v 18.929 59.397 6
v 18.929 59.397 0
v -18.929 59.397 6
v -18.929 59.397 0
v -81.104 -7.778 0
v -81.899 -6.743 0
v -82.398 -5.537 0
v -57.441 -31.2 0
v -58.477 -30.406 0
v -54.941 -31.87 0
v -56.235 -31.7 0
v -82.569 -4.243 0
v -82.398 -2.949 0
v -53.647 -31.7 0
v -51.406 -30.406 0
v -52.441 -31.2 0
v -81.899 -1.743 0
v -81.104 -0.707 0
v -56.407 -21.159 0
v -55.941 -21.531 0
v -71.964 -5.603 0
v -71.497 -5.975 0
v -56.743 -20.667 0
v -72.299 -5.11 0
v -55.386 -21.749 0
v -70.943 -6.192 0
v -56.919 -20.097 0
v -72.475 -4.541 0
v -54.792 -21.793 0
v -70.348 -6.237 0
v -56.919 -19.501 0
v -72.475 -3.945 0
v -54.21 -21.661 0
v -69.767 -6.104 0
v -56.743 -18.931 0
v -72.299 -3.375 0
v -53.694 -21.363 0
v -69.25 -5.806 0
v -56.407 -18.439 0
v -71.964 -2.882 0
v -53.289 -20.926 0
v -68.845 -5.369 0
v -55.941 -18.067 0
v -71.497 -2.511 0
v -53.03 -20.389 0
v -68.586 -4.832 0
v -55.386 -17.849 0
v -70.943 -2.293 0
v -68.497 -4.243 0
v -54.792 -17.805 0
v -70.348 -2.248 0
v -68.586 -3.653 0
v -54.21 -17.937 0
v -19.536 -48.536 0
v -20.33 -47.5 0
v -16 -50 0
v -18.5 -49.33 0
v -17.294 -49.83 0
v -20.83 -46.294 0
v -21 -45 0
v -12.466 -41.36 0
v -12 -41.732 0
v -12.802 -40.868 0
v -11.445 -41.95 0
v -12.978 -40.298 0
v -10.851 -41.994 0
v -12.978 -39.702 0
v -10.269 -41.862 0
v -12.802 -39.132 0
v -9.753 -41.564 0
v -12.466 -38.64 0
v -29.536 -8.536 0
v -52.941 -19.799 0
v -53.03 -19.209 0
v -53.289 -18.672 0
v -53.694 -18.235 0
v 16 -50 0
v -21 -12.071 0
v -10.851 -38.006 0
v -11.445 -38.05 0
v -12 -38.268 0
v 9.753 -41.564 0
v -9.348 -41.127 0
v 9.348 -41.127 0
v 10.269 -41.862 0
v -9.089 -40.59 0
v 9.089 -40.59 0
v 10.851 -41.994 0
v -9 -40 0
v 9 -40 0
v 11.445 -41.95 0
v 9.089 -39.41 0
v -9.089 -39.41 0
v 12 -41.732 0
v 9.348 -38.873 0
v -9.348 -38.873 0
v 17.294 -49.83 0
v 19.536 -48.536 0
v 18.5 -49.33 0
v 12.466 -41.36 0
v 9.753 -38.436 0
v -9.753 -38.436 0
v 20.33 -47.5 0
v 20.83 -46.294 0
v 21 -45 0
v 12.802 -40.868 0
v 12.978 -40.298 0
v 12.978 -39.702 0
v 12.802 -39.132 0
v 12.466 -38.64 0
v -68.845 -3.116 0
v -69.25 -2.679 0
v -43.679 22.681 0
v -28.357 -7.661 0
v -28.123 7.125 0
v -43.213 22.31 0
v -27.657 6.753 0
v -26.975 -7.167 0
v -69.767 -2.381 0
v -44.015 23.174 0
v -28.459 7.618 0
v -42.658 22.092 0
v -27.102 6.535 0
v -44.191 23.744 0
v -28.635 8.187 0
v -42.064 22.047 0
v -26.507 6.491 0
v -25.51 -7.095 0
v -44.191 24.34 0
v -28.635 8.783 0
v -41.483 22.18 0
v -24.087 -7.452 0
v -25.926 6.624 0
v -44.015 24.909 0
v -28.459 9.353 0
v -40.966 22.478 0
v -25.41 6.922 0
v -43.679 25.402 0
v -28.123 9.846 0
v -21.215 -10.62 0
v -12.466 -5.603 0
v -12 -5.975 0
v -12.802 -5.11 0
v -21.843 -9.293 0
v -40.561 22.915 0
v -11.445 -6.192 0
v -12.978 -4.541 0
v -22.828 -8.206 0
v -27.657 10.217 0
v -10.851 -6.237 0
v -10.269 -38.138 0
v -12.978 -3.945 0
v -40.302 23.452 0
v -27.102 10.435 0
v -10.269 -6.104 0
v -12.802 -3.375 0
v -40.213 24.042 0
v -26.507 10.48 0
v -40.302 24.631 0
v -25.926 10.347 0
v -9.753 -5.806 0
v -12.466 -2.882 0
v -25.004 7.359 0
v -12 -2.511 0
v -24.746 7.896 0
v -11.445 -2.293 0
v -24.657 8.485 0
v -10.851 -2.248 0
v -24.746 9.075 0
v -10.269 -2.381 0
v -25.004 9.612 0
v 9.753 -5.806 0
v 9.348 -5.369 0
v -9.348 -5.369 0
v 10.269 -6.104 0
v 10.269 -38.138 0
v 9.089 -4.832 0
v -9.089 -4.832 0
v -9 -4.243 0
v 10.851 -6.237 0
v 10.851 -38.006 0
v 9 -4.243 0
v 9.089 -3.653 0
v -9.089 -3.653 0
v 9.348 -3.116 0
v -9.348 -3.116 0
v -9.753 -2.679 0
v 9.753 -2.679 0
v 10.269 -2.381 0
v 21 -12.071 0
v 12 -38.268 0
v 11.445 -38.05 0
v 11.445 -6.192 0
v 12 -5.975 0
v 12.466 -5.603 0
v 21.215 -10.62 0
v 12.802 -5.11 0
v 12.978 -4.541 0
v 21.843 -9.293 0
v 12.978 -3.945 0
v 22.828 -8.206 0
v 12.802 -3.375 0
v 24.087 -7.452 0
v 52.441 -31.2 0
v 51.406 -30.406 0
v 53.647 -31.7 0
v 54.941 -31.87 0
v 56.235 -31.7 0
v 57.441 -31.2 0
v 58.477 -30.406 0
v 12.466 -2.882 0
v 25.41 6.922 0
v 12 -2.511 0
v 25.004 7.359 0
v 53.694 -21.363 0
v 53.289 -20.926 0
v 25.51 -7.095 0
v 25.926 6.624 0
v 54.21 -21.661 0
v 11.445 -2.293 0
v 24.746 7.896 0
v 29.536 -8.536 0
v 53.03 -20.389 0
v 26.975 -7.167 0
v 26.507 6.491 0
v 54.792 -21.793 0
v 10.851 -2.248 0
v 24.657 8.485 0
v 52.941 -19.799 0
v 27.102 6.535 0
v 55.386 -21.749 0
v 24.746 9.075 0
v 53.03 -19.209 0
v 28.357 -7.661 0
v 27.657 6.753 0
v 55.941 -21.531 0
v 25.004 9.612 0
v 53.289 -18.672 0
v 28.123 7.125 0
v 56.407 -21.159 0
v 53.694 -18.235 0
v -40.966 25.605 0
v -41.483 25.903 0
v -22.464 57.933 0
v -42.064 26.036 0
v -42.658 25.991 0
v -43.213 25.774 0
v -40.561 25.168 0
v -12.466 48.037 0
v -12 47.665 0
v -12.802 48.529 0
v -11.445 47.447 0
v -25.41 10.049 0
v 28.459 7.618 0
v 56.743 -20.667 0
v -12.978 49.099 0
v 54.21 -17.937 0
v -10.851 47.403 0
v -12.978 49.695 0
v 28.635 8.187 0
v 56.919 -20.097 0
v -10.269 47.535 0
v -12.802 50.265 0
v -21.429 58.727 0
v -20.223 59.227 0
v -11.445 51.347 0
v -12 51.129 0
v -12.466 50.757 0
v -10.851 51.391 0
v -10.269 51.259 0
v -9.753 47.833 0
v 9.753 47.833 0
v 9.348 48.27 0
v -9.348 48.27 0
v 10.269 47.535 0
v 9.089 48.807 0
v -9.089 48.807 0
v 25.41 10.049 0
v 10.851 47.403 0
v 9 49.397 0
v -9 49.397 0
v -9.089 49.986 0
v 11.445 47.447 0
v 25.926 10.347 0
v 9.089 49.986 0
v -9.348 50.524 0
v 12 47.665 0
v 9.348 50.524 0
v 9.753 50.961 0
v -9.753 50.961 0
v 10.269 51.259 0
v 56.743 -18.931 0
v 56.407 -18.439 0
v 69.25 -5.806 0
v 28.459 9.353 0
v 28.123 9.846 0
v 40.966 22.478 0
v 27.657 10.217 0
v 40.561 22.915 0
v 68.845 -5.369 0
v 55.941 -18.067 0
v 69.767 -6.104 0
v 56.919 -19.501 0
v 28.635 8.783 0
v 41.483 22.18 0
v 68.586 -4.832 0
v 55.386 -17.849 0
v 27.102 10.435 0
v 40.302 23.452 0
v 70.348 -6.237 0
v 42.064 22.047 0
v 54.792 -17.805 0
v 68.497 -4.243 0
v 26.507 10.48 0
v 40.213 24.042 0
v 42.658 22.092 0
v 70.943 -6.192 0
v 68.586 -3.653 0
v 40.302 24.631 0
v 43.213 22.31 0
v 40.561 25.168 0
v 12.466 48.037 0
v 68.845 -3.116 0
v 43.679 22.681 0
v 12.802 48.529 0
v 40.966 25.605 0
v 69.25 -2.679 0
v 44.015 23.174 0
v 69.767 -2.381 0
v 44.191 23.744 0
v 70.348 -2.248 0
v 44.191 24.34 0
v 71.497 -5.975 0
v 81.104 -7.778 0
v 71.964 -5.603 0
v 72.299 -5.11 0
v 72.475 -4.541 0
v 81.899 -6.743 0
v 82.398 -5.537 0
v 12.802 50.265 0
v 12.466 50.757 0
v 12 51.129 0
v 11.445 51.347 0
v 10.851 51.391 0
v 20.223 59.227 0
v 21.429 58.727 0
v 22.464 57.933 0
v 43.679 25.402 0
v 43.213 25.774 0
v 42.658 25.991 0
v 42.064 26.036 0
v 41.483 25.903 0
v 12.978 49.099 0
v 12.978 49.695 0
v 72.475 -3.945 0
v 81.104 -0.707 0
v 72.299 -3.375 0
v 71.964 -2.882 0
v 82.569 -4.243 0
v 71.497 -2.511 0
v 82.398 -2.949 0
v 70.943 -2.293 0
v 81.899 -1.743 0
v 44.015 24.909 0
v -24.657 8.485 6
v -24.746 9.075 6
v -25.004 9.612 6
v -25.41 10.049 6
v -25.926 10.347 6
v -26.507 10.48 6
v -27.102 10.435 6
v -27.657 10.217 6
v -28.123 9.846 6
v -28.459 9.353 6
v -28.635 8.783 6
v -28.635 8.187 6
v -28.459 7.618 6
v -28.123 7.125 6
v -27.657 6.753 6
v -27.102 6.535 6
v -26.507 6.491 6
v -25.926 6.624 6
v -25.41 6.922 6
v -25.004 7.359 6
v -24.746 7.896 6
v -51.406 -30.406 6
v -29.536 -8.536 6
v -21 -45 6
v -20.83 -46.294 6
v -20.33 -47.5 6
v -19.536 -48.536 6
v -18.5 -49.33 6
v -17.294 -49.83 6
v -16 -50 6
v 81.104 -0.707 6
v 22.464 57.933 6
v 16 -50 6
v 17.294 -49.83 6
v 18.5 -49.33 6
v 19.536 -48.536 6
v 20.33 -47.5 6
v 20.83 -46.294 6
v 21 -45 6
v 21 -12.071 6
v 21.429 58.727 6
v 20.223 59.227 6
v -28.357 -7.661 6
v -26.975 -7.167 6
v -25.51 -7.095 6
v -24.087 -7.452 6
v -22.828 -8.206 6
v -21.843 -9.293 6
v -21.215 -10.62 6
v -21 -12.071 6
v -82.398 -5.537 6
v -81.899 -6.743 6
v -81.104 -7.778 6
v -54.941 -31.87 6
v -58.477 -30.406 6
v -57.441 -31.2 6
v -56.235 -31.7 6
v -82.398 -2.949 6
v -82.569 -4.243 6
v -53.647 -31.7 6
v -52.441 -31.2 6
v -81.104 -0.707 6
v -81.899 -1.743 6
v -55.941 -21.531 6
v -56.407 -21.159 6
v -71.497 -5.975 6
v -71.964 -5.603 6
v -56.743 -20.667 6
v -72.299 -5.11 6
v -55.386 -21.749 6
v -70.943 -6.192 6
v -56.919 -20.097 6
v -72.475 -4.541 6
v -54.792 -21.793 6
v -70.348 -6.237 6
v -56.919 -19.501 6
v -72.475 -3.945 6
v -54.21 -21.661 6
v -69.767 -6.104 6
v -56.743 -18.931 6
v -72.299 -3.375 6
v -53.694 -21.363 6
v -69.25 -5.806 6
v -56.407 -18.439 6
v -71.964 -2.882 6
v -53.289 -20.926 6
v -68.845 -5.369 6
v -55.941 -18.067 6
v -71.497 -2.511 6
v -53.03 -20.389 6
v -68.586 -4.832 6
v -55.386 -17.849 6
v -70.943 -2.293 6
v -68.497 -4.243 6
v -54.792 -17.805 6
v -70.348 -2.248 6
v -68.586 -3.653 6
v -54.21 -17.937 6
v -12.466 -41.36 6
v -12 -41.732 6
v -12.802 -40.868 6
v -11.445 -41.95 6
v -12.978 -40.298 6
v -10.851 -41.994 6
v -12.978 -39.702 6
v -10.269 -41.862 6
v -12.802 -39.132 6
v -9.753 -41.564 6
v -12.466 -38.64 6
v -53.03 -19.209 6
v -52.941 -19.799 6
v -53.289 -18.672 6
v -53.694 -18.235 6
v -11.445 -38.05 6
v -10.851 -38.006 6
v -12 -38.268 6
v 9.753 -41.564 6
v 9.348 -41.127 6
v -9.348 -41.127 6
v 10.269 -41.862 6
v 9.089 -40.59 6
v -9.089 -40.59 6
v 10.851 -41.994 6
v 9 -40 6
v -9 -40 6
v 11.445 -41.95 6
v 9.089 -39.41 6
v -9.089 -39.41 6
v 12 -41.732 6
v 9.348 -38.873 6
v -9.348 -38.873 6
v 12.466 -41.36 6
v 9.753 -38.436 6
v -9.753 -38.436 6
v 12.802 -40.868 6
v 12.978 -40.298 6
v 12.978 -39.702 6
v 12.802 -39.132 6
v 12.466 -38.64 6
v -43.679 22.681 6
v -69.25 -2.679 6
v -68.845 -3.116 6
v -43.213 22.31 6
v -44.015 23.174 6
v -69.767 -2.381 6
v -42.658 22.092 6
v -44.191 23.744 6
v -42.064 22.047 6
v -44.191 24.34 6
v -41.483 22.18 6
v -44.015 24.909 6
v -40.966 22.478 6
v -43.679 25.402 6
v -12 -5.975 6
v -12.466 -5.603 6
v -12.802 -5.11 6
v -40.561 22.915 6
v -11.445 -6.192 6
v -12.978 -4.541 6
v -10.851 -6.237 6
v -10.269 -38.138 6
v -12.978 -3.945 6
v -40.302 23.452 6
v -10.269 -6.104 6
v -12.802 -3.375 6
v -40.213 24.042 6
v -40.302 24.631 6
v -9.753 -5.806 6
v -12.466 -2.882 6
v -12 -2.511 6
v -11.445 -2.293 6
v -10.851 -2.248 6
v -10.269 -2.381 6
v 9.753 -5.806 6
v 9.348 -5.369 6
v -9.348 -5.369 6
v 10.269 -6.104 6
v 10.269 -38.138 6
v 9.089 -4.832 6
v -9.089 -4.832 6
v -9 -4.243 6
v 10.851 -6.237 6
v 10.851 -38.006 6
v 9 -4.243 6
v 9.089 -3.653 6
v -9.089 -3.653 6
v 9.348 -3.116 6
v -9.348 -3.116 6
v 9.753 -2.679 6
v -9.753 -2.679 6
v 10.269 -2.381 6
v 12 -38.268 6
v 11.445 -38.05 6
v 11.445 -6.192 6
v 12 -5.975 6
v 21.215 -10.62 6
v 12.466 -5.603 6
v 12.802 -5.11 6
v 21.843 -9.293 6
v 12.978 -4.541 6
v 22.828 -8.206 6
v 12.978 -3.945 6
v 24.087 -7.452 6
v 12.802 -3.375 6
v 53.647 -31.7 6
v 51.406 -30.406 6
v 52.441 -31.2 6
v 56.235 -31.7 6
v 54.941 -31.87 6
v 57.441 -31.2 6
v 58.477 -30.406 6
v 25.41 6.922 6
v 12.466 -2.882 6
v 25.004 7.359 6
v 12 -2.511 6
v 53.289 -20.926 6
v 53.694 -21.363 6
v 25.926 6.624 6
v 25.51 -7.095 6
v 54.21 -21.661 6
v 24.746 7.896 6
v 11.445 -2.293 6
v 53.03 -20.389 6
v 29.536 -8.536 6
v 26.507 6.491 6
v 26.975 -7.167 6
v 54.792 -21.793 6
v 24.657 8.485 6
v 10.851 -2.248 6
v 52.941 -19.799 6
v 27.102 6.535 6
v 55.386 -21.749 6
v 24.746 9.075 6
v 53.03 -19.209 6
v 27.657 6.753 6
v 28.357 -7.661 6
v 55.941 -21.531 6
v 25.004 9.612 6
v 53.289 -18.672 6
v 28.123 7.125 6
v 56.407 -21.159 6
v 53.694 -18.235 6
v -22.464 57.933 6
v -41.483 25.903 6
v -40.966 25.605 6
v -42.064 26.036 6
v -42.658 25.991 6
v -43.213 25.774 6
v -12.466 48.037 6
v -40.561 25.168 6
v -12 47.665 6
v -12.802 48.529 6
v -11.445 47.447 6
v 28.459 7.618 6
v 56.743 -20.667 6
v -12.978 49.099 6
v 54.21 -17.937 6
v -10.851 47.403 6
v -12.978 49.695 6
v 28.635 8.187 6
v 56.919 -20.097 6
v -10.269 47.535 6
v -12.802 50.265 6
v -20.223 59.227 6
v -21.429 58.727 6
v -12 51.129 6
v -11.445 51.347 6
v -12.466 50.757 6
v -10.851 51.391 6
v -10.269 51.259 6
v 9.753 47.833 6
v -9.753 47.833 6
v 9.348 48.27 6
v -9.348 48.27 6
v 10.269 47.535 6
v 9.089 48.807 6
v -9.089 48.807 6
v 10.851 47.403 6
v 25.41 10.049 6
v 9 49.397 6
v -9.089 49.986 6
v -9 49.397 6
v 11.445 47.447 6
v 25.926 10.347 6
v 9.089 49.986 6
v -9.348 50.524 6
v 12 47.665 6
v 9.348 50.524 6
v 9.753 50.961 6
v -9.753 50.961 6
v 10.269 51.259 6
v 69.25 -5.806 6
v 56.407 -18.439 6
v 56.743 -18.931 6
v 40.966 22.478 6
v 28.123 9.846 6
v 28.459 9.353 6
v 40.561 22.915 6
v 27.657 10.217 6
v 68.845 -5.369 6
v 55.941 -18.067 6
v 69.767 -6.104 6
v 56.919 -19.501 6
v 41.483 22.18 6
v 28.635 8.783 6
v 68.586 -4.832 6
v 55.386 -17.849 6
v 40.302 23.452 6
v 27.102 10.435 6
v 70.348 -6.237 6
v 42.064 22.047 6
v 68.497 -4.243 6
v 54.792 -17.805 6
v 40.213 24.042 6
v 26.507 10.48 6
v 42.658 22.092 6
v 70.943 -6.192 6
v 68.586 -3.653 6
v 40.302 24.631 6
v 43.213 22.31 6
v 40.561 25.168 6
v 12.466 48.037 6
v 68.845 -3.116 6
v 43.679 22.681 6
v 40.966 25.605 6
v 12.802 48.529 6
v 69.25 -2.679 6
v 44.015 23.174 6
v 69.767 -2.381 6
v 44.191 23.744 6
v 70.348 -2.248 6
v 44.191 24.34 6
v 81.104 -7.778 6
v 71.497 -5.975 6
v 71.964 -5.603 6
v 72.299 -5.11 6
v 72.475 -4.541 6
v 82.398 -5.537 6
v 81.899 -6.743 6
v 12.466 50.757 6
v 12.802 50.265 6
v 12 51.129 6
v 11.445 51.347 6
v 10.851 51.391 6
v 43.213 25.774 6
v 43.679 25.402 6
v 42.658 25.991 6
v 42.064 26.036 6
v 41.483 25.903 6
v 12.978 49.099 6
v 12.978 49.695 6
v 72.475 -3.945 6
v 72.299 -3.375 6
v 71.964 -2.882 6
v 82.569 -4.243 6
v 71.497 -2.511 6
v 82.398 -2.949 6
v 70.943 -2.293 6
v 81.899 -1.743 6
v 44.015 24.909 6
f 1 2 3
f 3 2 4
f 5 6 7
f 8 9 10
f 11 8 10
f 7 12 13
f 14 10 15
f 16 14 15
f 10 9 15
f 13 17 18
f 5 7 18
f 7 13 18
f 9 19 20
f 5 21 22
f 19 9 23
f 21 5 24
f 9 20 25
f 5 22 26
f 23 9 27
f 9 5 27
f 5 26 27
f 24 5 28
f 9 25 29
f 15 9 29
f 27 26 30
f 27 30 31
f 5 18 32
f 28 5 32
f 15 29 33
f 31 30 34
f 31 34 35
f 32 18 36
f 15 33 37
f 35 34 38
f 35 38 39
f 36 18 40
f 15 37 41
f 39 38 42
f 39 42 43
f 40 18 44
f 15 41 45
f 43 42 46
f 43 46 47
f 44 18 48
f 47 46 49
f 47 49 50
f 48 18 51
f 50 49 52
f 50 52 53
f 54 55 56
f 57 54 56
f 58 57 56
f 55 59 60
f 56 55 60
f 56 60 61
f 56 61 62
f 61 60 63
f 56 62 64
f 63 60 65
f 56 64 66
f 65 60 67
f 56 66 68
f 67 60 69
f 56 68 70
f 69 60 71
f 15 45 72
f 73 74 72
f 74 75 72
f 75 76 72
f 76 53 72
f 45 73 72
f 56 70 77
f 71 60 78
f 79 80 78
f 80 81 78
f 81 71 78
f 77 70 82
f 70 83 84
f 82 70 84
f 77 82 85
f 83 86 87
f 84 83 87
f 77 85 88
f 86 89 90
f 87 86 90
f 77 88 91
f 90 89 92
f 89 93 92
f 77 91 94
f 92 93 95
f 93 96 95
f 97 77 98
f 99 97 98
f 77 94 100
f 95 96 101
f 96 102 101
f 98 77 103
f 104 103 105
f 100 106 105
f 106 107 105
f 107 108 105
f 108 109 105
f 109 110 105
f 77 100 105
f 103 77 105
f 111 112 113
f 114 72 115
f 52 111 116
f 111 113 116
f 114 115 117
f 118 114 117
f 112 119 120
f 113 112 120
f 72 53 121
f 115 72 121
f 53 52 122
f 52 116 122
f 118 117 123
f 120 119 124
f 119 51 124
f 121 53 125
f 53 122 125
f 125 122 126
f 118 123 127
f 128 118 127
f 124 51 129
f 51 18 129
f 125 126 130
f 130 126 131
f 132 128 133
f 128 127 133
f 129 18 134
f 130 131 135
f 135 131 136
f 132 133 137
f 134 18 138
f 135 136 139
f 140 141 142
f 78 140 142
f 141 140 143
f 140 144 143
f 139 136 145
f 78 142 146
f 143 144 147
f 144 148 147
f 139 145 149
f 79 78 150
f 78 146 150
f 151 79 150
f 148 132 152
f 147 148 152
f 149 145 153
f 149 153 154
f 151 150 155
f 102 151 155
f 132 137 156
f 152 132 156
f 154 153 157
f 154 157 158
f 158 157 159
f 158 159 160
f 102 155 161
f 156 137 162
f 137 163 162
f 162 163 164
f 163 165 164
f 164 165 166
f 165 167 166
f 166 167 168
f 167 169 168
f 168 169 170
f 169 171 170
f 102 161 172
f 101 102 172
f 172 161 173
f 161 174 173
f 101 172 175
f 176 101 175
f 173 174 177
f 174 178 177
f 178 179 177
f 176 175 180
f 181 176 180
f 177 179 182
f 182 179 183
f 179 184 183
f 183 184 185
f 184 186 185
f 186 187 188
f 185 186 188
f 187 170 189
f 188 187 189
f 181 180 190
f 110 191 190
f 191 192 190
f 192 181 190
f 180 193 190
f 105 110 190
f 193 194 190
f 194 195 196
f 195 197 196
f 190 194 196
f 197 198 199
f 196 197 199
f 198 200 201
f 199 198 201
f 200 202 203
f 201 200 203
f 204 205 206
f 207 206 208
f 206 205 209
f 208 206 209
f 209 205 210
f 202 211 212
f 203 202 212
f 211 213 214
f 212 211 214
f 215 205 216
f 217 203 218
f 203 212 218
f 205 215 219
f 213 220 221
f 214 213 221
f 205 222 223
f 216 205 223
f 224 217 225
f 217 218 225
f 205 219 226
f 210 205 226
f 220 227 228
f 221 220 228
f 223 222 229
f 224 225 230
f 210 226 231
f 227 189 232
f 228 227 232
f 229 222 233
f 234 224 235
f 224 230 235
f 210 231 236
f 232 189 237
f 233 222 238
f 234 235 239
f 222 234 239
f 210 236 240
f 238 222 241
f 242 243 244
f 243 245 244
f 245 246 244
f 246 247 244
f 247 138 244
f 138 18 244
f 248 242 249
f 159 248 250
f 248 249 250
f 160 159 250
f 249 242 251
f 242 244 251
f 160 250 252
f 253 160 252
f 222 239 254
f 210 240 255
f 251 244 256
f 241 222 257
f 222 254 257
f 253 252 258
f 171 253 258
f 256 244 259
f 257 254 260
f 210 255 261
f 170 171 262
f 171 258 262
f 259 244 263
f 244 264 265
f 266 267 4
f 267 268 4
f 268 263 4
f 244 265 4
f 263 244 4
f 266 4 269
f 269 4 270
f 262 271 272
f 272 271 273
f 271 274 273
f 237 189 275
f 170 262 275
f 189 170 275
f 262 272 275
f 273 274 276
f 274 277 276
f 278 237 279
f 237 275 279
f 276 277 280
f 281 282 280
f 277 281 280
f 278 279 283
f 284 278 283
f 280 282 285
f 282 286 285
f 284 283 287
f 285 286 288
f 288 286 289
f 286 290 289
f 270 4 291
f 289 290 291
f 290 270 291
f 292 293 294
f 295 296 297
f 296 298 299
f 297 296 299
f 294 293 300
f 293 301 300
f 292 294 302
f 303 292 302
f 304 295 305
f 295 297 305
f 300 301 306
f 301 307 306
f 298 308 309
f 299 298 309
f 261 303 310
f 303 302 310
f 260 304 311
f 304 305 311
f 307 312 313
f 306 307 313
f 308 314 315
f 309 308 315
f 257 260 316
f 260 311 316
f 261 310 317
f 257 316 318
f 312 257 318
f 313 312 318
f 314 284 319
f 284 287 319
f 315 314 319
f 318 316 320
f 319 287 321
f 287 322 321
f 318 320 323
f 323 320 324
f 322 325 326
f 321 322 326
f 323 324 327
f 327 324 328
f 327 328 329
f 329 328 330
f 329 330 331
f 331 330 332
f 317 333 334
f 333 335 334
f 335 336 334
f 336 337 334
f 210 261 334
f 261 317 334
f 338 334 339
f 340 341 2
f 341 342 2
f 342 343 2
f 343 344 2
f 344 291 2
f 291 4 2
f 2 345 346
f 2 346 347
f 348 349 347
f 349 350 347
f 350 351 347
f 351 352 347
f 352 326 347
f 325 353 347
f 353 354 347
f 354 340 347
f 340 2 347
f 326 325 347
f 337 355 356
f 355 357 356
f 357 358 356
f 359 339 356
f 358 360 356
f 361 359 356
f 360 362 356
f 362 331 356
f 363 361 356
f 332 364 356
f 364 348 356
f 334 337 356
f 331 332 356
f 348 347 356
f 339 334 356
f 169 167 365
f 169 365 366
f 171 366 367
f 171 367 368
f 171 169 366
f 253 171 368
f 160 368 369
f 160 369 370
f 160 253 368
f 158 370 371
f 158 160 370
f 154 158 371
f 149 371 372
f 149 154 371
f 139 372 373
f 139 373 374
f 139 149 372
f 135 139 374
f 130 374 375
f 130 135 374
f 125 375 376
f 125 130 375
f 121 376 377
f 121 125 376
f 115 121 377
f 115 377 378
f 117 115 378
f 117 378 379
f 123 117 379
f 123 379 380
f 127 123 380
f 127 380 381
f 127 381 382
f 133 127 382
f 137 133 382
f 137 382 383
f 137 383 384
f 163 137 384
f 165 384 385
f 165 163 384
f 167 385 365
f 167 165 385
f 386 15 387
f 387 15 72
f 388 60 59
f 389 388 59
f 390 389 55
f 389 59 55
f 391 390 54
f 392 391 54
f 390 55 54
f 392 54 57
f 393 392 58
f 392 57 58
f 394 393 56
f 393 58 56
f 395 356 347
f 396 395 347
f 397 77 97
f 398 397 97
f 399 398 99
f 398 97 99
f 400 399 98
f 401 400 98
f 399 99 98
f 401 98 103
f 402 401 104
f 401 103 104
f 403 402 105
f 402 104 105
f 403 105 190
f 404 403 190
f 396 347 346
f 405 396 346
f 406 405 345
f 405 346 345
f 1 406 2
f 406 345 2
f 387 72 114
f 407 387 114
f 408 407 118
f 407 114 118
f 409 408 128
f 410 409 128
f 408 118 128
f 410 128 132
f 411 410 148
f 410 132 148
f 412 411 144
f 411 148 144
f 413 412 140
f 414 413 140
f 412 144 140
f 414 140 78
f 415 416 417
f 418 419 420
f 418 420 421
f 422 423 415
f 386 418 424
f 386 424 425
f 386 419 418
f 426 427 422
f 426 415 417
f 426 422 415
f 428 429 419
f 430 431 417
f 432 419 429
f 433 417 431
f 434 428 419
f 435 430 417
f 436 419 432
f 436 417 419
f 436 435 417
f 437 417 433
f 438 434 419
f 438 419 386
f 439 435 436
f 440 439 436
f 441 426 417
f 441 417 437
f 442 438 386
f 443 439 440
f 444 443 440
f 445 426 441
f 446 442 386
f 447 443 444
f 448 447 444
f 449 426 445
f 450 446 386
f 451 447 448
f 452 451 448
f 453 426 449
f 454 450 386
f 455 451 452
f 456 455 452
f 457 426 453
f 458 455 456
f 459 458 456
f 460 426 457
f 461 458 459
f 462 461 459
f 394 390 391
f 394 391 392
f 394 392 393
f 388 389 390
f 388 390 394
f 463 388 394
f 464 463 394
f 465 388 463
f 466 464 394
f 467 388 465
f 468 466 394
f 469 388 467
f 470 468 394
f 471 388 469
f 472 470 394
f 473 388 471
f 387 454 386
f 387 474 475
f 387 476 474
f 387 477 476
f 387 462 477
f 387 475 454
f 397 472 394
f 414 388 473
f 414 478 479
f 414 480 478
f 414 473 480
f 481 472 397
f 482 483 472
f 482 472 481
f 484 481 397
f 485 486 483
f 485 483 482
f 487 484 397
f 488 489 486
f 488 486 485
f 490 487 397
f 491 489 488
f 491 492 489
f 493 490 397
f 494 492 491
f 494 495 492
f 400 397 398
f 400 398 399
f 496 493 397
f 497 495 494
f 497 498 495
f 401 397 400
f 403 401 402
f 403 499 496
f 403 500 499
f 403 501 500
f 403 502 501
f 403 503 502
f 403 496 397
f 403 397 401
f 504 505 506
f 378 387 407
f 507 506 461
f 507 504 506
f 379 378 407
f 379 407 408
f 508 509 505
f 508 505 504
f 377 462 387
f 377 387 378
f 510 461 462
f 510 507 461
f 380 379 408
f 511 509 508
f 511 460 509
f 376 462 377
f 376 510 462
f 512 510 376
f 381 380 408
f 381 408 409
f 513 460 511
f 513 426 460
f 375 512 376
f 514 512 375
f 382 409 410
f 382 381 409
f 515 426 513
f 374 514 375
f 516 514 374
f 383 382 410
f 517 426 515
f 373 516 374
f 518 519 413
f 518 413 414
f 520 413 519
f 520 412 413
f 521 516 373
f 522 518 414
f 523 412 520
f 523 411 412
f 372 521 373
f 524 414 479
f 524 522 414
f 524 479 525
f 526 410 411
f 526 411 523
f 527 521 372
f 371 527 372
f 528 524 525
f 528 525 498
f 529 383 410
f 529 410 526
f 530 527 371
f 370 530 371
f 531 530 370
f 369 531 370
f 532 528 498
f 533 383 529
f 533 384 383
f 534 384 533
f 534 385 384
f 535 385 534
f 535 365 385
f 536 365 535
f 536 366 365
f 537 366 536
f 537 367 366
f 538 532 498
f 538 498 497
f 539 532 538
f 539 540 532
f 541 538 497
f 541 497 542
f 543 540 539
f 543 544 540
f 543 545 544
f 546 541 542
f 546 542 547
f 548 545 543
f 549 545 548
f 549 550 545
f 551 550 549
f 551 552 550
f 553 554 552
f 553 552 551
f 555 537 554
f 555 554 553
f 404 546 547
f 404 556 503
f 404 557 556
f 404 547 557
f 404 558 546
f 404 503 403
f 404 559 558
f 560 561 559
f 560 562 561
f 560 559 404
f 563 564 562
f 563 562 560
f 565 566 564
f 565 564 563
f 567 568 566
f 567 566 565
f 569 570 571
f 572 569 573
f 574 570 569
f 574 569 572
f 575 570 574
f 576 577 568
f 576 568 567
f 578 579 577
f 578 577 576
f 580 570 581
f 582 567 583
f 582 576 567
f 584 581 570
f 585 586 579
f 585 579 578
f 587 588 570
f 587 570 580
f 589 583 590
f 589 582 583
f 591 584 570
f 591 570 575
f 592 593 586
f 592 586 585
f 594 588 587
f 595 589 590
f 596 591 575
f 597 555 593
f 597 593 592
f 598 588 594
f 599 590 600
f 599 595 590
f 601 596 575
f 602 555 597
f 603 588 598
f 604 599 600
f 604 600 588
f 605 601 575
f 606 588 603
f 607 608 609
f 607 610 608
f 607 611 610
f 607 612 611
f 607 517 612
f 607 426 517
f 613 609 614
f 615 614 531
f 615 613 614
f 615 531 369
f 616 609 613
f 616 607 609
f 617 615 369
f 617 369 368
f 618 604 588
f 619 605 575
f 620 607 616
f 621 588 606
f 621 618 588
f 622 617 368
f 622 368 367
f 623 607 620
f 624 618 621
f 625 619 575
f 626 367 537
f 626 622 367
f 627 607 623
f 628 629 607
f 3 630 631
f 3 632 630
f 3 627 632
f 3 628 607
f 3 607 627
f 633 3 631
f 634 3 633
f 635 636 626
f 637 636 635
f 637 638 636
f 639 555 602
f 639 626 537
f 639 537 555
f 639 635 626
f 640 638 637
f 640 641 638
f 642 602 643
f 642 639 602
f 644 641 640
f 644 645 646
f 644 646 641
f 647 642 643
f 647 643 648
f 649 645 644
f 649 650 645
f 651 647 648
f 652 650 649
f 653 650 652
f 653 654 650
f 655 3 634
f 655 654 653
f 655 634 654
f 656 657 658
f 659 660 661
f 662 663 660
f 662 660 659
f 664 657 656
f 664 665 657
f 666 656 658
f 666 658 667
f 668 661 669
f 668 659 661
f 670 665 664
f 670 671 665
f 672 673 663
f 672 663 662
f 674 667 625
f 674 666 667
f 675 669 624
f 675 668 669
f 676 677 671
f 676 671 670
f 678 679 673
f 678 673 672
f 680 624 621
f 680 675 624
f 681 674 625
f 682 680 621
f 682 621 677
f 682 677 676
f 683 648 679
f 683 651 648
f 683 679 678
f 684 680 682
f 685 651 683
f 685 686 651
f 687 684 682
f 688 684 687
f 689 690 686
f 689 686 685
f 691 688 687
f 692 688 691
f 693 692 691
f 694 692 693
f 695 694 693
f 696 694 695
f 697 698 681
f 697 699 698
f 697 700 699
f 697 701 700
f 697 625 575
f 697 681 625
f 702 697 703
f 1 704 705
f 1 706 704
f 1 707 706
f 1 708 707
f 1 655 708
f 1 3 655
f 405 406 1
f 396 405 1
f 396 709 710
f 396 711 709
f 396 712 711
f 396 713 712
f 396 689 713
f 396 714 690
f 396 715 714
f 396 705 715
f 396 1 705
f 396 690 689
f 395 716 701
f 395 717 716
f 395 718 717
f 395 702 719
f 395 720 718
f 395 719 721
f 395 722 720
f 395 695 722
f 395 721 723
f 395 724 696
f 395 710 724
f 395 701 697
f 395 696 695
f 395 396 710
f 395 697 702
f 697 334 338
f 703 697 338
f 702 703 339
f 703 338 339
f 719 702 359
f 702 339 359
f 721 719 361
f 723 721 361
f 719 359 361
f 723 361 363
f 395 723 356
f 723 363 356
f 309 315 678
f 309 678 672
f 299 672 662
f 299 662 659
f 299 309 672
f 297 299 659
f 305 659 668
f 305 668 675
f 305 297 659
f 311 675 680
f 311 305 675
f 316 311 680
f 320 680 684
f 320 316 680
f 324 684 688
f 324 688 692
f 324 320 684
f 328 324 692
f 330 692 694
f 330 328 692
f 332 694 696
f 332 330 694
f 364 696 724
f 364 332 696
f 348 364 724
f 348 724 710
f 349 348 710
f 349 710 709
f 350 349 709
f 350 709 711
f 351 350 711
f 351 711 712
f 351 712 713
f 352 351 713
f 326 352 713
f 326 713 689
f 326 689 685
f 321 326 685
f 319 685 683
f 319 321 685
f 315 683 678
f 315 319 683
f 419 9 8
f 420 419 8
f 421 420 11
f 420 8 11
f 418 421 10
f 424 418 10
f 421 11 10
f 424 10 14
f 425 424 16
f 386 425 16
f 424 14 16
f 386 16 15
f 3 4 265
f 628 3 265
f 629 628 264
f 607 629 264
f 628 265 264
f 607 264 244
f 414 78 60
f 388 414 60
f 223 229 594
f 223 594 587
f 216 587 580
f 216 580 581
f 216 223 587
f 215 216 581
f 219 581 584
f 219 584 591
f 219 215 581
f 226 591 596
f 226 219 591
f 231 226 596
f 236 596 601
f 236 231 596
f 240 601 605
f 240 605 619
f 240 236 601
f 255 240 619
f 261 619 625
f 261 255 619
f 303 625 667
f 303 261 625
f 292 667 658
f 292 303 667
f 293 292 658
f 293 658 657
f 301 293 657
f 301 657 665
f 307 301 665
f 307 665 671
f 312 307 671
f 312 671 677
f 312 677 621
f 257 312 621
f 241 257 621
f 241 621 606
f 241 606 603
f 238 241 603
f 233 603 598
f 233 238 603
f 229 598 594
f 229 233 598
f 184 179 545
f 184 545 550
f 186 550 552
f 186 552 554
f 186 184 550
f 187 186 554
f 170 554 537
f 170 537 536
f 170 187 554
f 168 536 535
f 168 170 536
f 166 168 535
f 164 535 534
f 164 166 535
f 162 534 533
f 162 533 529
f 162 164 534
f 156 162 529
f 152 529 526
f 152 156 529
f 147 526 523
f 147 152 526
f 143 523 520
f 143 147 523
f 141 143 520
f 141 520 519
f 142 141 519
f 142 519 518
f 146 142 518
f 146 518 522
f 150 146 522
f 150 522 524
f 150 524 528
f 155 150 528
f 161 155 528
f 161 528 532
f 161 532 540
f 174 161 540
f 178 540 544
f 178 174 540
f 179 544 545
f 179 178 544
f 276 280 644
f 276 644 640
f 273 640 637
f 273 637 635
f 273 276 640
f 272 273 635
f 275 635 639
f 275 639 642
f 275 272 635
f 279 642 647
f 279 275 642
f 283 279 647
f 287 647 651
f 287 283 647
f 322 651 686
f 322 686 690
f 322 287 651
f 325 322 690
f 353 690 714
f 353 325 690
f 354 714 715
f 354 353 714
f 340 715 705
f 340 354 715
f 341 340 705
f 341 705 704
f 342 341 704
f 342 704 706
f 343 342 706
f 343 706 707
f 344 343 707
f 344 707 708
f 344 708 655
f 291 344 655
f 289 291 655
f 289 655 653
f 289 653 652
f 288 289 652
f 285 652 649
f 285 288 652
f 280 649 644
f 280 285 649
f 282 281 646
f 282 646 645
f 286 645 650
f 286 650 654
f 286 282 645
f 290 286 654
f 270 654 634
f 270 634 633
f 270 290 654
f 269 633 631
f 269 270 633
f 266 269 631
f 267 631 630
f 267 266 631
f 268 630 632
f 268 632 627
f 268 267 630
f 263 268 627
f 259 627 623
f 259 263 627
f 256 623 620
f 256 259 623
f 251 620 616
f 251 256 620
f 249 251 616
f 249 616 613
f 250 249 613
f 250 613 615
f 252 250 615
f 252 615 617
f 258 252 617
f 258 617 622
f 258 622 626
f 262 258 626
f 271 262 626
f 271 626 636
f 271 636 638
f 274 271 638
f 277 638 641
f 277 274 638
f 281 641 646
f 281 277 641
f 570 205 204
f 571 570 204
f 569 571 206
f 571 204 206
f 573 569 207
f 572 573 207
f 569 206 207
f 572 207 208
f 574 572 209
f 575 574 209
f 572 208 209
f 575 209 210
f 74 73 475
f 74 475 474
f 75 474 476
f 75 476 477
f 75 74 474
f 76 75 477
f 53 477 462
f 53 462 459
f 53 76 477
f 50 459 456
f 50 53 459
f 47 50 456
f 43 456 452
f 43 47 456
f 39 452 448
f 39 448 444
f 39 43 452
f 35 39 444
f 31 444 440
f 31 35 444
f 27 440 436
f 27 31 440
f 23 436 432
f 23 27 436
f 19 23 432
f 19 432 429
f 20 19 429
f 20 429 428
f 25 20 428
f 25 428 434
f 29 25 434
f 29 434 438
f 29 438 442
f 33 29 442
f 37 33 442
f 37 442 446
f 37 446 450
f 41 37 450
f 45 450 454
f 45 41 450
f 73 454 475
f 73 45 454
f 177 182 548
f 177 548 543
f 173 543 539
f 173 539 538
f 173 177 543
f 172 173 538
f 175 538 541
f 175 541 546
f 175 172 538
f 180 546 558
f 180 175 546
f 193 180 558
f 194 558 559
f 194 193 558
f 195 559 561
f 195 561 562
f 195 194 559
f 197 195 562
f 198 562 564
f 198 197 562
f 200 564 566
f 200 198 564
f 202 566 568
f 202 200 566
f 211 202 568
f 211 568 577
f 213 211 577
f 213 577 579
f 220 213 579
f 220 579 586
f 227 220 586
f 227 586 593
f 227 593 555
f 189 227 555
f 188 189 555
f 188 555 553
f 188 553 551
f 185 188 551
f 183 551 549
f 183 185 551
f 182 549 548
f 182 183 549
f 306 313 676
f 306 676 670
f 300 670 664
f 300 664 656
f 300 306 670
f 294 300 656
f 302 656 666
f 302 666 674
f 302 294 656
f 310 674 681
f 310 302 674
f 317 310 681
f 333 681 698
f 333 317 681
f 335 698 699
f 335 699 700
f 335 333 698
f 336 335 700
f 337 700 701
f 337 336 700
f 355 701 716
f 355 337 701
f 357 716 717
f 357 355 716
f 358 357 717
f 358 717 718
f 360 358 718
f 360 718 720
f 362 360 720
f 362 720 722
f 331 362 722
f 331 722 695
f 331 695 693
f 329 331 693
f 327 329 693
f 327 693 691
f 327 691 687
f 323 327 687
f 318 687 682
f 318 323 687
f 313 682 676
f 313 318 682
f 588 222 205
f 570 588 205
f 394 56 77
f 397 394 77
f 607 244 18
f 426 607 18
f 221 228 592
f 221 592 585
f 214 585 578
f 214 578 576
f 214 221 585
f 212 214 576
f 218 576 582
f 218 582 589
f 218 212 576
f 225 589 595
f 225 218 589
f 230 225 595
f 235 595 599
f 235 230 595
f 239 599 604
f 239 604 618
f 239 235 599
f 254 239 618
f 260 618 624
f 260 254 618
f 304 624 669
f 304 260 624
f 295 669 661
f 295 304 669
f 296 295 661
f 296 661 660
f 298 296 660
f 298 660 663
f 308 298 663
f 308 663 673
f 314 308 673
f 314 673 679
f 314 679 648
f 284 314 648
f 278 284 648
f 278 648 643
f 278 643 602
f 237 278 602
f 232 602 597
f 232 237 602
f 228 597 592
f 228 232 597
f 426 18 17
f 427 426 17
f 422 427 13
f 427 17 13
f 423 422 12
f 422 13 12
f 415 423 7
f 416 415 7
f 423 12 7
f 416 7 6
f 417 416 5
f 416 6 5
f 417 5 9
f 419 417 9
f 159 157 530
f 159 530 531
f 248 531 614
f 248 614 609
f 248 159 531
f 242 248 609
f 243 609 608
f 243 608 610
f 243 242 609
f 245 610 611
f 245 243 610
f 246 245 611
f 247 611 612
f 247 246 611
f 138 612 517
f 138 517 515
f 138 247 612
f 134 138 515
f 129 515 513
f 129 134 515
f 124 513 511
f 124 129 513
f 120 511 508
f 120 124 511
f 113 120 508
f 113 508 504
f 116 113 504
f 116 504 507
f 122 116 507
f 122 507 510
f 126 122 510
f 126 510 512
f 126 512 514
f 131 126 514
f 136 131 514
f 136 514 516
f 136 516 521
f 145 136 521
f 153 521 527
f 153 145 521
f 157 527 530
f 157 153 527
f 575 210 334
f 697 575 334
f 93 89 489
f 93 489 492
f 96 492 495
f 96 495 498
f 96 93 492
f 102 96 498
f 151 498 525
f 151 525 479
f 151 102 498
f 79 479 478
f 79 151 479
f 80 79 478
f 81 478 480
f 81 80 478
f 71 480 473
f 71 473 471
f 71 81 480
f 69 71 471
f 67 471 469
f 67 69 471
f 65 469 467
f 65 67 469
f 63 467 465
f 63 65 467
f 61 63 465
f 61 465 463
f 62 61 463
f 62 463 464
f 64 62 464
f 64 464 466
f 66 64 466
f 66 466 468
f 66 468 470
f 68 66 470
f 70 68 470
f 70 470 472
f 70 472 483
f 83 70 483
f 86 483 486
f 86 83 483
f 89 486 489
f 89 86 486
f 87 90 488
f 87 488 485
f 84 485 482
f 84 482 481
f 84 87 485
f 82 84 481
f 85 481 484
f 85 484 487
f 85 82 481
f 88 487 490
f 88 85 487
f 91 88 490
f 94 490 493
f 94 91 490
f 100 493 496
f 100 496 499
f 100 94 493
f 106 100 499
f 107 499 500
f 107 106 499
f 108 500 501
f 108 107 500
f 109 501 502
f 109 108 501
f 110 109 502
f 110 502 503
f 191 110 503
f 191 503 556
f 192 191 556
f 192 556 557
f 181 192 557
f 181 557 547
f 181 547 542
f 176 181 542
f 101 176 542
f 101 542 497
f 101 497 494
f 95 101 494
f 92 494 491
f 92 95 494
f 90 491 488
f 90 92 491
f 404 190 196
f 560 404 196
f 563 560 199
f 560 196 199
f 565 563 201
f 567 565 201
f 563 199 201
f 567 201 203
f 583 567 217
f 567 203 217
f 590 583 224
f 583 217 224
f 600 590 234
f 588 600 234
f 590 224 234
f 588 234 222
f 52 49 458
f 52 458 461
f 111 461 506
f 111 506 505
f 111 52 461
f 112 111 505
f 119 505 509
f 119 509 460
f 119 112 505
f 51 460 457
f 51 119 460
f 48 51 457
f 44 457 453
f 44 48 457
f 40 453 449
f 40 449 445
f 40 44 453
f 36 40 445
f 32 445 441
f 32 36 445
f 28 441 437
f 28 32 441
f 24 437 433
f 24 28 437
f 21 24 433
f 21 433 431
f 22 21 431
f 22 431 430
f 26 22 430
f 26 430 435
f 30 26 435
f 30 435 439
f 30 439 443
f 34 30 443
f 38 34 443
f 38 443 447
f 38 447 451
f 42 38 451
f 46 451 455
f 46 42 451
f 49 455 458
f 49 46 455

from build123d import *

# Parameters (mm, degrees)
SKETCH_1_R      = 2
EXTRUDE_1_DEPTH = 6


with BuildPart() as part:
    # Эскиз1 → Бобышка-Вытянуть1 (new body)
    with BuildSketch(Plane.XY):
        with BuildLine():
            Line((-16, -50), (16, -50))
            ThreePointArc((16, -50), (19.535533906, -48.535533906), (21, -45))
            Line((21, -45), (21, -12.071067812))
            ThreePointArc((21, -12.071067812), (24.086582838, -7.451670149), (29.535533906, -8.535533906))
            Line((29.535533906, -8.535533906), (51.405591591, -30.405591591))
            ThreePointArc((51.405591591, -30.405591591), (54.941125497, -31.870057685), (58.476659403, -30.405591591))
            Line((58.476659403, -30.405591591), (81.104076401, -7.778174593))
            ThreePointArc((81.104076401, -7.778174593), (82.568542495, -4.242640687), (81.104076401, -0.707106781))
            Line((81.104076401, -0.707106781), (22.464466094, 57.932503526))
            ThreePointArc((22.464466094, 57.932503526), (20.84234935, 59.016367282), (18.928932188, 59.39696962))
            Line((18.928932188, 59.39696962), (-18.928932188, 59.39696962))
            ThreePointArc((-18.928932188, 59.39696962), (-20.84234935, 59.016367282), (-22.464466094, 57.932503526))
            Line((-22.464466094, 57.932503526), (-81.104076401, -0.707106781))
            ThreePointArc((-81.104076401, -0.707106781), (-82.568542495, -4.242640687), (-81.104076401, -7.778174593))
            Line((-81.104076401, -7.778174593), (-58.476659403, -30.405591591))
            ThreePointArc((-58.476659403, -30.405591591), (-54.941125497, -31.870057685), (-51.405591591, -30.405591591))
            Line((-51.405591591, -30.405591591), (-29.535533906, -8.535533906))
            ThreePointArc((-29.535533906, -8.535533906), (-24.086582838, -7.451670149), (-21, -12.071067812))
            Line((-21, -12.071067812), (-21, -45))
            ThreePointArc((-21, -45), (-19.535533906, -48.535533906), (-16, -50))
        make_face()
        with Locations((-70.497474683, -4.242640687)):
            Circle(SKETCH_1_R, mode=Mode.SUBTRACT)
        with Locations((-54.941125497, -19.798989873)):
            Circle(SKETCH_1_R, mode=Mode.SUBTRACT)
        with Locations((-42.213203436, 24.04163056)):
            Circle(SKETCH_1_R, mode=Mode.SUBTRACT)
        with Locations((-26.656854249, 8.485281374)):
            Circle(SKETCH_1_R, mode=Mode.SUBTRACT)
        with Locations((-11, -40)):
            Circle(SKETCH_1_R, mode=Mode.SUBTRACT)
        with Locations((-11, 49.39696962)):
            Circle(SKETCH_1_R, mode=Mode.SUBTRACT)
        with Locations((-11, -4.242640687)):
            Circle(SKETCH_1_R, mode=Mode.SUBTRACT)
        with Locations(Location((11, -40, 0), (0, 0, 180))):
            Circle(SKETCH_1_R, mode=Mode.SUBTRACT)
        with Locations(Location((11, -4.242640687, 0), (0, 0, 180))):
            Circle(SKETCH_1_R, mode=Mode.SUBTRACT)
        with Locations(Location((26.656854249, 8.485281374, 0), (0, 0, 180))):
            Circle(SKETCH_1_R, mode=Mode.SUBTRACT)
        with Locations(Location((54.941125497, -19.798989873, 0), (0, 0, 180))):
            Circle(SKETCH_1_R, mode=Mode.SUBTRACT)
        with Locations(Location((70.497474683, -4.242640687, 0), (0, 0, 180))):
            Circle(SKETCH_1_R, mode=Mode.SUBTRACT)
        with Locations(Location((42.213203436, 24.04163056, 0), (0, 0, 180))):
            Circle(SKETCH_1_R, mode=Mode.SUBTRACT)
        with Locations(Location((11, 49.39696962, 0), (0, 0, 180))):
            Circle(SKETCH_1_R, mode=Mode.SUBTRACT)
    extrude(amount=EXTRUDE_1_DEPTH)


solid = part.part
